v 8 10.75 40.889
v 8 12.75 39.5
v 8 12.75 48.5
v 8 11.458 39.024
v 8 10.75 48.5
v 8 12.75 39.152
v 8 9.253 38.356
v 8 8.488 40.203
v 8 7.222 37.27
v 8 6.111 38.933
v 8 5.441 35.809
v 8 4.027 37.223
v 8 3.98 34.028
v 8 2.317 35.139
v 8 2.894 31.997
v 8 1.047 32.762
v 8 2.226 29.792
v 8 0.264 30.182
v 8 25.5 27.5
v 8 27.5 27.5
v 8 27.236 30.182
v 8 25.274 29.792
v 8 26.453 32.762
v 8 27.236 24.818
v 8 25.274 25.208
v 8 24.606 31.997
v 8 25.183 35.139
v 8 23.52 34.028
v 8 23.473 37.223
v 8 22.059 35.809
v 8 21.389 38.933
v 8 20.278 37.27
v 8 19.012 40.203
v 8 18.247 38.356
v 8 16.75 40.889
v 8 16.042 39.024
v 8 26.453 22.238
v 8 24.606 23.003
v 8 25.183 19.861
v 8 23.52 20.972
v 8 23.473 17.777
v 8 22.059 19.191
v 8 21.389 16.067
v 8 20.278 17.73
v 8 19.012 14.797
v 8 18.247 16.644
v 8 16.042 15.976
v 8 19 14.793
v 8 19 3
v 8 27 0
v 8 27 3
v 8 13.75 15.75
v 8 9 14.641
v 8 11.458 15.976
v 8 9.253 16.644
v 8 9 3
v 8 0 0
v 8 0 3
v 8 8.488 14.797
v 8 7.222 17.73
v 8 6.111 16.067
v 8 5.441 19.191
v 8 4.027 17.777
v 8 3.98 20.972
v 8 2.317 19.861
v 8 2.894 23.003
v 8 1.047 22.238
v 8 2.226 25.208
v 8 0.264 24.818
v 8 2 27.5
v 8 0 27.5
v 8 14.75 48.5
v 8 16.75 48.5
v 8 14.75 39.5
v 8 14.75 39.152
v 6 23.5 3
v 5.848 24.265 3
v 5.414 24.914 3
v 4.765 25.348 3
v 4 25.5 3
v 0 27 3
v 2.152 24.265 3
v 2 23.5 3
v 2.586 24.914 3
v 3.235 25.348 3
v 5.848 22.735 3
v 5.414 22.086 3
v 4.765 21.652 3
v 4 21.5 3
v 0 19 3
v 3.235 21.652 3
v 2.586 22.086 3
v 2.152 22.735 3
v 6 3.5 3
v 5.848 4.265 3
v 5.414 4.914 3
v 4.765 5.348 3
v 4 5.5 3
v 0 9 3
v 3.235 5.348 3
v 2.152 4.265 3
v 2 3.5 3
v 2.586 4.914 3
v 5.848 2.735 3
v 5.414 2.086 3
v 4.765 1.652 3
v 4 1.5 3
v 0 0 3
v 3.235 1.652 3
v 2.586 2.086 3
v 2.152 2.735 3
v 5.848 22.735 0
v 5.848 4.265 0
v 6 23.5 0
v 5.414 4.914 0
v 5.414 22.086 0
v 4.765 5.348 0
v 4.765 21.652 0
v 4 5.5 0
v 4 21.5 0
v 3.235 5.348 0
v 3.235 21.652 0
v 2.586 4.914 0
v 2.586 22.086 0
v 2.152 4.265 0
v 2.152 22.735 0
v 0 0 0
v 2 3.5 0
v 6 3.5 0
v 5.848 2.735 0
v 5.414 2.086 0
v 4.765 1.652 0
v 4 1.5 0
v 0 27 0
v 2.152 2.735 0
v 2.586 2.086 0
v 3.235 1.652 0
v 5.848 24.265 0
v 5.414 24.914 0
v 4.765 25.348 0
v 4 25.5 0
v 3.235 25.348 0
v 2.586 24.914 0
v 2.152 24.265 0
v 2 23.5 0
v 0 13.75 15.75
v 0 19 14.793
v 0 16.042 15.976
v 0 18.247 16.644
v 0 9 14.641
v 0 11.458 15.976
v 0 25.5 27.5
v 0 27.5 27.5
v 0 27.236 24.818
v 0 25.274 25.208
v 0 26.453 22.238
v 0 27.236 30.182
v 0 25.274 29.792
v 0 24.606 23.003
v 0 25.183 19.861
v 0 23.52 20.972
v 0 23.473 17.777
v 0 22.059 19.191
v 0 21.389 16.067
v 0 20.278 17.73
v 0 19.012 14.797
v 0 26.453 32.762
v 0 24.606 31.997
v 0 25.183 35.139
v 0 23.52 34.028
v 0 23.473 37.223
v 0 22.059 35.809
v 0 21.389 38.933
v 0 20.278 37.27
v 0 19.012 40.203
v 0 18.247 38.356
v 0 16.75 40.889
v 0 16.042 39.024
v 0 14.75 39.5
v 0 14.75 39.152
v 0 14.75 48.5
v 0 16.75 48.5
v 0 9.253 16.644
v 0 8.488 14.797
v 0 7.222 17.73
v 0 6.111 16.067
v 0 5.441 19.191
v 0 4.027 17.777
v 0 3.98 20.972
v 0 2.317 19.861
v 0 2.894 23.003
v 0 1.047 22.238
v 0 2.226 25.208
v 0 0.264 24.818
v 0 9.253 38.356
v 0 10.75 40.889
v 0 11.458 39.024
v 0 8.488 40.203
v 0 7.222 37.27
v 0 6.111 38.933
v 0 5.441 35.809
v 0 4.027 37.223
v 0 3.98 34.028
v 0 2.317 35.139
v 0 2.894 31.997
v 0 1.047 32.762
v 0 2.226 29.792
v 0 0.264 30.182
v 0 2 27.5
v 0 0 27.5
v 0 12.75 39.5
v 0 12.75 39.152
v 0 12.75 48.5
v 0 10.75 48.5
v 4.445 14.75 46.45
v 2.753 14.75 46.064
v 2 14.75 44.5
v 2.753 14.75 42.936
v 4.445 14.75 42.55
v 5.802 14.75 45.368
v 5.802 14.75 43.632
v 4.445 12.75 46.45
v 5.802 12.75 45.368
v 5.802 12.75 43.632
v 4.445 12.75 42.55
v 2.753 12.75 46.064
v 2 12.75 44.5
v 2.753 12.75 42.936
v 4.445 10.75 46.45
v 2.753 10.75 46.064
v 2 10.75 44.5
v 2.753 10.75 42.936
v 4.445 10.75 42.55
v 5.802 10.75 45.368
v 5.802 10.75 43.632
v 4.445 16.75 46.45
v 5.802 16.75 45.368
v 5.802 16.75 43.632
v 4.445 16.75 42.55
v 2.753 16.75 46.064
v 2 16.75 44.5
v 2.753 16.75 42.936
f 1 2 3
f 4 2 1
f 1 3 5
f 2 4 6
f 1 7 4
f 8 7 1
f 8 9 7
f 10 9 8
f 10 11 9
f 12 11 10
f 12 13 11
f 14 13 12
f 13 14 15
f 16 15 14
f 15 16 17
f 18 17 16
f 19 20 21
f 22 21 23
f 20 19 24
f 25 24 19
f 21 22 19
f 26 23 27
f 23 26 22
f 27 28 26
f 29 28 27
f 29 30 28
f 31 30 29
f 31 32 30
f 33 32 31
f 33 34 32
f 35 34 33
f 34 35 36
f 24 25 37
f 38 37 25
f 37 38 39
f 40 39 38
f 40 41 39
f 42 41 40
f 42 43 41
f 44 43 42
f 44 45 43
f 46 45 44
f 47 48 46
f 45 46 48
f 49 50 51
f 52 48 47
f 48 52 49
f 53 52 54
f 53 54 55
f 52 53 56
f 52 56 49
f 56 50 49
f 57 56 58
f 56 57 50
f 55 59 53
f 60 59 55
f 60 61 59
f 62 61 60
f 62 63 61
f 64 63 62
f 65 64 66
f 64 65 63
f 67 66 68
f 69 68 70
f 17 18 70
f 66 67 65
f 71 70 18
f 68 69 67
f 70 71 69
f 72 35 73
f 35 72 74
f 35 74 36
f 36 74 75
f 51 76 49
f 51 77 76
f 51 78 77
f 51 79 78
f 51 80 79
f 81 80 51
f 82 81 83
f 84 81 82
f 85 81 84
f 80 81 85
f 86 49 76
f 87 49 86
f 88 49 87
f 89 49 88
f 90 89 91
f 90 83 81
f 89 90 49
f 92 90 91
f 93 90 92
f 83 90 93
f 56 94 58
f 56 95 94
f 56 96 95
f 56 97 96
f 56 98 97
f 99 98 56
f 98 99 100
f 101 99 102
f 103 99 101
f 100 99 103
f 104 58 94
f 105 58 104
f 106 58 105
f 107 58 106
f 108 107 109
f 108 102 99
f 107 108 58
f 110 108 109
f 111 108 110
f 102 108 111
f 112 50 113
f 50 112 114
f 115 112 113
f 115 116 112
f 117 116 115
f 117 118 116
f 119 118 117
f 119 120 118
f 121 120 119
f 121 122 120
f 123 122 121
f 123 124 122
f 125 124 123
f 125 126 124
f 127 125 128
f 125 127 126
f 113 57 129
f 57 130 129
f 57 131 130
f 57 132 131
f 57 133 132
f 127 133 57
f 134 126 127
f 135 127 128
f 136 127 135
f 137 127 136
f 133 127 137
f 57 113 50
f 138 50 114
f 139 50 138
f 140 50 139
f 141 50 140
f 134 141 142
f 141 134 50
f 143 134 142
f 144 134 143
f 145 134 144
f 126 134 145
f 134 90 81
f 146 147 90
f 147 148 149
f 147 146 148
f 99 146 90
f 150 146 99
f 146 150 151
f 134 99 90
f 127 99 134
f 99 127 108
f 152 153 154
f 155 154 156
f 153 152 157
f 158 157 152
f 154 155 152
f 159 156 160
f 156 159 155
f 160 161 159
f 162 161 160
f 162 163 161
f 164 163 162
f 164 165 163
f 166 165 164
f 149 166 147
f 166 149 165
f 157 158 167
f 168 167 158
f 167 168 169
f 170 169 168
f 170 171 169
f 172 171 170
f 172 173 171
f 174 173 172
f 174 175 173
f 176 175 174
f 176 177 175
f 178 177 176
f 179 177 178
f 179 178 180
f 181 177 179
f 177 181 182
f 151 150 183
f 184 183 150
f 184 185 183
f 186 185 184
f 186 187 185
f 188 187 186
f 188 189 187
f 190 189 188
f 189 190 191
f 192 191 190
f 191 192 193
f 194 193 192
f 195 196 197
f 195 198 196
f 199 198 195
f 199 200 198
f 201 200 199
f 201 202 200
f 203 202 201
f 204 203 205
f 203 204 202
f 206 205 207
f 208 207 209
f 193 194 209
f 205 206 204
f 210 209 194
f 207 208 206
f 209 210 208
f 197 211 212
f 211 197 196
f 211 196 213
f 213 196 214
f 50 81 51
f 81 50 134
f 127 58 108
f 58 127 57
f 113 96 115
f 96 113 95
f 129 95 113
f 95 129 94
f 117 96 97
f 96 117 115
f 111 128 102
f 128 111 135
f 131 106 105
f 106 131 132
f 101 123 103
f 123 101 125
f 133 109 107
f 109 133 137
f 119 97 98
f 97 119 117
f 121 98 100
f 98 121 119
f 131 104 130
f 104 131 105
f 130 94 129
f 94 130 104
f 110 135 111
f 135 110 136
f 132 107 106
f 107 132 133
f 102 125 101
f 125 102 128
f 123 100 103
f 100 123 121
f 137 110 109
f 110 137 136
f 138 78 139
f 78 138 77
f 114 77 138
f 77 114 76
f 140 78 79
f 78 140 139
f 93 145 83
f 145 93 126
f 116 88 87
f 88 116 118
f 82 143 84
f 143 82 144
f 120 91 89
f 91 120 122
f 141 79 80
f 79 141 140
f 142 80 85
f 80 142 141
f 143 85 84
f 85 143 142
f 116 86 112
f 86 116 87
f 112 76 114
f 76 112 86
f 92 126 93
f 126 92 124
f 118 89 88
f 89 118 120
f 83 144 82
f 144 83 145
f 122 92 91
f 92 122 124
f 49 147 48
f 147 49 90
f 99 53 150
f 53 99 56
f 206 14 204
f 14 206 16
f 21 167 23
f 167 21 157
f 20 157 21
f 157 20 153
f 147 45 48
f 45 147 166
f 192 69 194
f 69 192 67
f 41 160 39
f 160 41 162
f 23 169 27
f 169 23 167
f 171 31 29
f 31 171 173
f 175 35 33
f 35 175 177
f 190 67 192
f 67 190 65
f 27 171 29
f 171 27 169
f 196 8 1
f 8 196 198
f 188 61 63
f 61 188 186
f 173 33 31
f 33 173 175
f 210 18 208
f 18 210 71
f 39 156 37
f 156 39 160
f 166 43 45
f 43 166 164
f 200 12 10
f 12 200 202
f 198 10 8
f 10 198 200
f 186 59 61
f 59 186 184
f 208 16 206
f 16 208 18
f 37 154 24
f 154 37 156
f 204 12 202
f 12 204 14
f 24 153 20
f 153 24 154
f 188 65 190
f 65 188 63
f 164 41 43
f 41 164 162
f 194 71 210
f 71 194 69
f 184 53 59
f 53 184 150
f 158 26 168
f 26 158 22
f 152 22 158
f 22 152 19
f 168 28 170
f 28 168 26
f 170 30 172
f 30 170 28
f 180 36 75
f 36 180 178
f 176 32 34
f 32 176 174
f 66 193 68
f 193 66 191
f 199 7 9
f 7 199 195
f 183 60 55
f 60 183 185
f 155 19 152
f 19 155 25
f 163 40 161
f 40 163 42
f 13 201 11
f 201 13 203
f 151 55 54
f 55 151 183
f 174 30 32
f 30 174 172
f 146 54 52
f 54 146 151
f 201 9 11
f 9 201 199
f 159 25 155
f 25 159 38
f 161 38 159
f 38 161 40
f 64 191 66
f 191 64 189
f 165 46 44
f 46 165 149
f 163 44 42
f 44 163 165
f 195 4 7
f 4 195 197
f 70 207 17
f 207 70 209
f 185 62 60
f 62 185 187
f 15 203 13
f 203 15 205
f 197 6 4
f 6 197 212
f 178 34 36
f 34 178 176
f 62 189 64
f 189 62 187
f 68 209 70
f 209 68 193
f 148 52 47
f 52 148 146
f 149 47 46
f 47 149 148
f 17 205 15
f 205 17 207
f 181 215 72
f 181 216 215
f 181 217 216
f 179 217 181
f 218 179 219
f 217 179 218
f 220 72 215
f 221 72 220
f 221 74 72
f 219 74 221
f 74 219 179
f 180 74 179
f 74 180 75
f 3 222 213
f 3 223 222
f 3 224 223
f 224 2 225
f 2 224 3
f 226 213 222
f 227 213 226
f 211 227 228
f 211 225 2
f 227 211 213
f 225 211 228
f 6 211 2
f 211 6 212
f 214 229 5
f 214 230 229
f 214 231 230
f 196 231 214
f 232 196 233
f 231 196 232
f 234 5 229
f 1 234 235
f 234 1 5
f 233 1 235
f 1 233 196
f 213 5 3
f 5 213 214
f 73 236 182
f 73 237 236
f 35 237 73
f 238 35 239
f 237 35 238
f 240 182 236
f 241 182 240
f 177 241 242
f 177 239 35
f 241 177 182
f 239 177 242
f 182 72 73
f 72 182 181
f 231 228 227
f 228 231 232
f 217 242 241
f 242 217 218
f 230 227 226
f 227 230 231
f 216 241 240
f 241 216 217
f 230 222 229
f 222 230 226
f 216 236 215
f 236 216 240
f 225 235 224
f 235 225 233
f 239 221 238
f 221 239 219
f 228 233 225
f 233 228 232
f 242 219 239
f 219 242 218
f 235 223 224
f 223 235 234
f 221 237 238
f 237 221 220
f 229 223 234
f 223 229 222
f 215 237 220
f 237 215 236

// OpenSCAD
hole_spacing = 20;
hole_diameter = 4;

height = 8;

lower_diameter = 23.5;
upper_diameter = 37;

module lower() {
  difference() {
    cylinder(d=lower_diameter+4, h=height, $fn=32);
    cylinder(d=lower_diameter, h=height, $fn=32);
    translate([-1,10,0]) cube([2,5,height]);
  }


  difference() {
    union() {
      translate([-3,12,0]) cube([2,9,height]);
      translate([1,12,0]) cube([2,9,height]);
    }
    rotate([0,90,0]) translate([-4,17,-5]) cylinder(d=4, h=10);
  }
}

module upper() {
  difference() {
    cylinder(d=upper_diameter+4, h=height, $fn=32);
    cylinder(d=upper_diameter, h=height, $fn=32);
    translate([-1,17,0]) cube([2,5,height]);
  }


  difference() {
    union() {
      translate([-3,20,0]) cube([2,9,height]);
      translate([1,20,0]) cube([2,9,height]);
    }
    rotate([0,90,0]) translate([-4,25,-5]) cylinder(d=4, h=10);
  }
}

// lower();
// upper();

module mount(stem) {
  height = 3;
  length = 27;
  width = 8;

  hole_offset = (length-hole_spacing)/2;
  difference() {
    cube([width,length,height]);
    translate([width/2,hole_offset,-(height/2)]) cylinder(d=hole_diameter, h=height*2, $fn=16);
    translate([width/2,length-hole_offset,-(height/2)]) cylinder(d=hole_diameter, h=height*2, $fn=16);
  }

  translate([0, length/3, 0]) cube([width, hole_spacing/2, stem]);
}

module lower_mount() {
  mount(15);
  rotate([90,0,90]) translate([(lower_diameter+4)/2,((upper_diameter+4)/2)+7,0]) lower();
}

module upper_mount() {
  mount(8);
  rotate([90,0,90]) translate([(lower_diameter+4)/2,((upper_diameter+4)/2)+7,0]) upper();
}

lower_mount();
// translate([0,40,0]) upper_mount();
